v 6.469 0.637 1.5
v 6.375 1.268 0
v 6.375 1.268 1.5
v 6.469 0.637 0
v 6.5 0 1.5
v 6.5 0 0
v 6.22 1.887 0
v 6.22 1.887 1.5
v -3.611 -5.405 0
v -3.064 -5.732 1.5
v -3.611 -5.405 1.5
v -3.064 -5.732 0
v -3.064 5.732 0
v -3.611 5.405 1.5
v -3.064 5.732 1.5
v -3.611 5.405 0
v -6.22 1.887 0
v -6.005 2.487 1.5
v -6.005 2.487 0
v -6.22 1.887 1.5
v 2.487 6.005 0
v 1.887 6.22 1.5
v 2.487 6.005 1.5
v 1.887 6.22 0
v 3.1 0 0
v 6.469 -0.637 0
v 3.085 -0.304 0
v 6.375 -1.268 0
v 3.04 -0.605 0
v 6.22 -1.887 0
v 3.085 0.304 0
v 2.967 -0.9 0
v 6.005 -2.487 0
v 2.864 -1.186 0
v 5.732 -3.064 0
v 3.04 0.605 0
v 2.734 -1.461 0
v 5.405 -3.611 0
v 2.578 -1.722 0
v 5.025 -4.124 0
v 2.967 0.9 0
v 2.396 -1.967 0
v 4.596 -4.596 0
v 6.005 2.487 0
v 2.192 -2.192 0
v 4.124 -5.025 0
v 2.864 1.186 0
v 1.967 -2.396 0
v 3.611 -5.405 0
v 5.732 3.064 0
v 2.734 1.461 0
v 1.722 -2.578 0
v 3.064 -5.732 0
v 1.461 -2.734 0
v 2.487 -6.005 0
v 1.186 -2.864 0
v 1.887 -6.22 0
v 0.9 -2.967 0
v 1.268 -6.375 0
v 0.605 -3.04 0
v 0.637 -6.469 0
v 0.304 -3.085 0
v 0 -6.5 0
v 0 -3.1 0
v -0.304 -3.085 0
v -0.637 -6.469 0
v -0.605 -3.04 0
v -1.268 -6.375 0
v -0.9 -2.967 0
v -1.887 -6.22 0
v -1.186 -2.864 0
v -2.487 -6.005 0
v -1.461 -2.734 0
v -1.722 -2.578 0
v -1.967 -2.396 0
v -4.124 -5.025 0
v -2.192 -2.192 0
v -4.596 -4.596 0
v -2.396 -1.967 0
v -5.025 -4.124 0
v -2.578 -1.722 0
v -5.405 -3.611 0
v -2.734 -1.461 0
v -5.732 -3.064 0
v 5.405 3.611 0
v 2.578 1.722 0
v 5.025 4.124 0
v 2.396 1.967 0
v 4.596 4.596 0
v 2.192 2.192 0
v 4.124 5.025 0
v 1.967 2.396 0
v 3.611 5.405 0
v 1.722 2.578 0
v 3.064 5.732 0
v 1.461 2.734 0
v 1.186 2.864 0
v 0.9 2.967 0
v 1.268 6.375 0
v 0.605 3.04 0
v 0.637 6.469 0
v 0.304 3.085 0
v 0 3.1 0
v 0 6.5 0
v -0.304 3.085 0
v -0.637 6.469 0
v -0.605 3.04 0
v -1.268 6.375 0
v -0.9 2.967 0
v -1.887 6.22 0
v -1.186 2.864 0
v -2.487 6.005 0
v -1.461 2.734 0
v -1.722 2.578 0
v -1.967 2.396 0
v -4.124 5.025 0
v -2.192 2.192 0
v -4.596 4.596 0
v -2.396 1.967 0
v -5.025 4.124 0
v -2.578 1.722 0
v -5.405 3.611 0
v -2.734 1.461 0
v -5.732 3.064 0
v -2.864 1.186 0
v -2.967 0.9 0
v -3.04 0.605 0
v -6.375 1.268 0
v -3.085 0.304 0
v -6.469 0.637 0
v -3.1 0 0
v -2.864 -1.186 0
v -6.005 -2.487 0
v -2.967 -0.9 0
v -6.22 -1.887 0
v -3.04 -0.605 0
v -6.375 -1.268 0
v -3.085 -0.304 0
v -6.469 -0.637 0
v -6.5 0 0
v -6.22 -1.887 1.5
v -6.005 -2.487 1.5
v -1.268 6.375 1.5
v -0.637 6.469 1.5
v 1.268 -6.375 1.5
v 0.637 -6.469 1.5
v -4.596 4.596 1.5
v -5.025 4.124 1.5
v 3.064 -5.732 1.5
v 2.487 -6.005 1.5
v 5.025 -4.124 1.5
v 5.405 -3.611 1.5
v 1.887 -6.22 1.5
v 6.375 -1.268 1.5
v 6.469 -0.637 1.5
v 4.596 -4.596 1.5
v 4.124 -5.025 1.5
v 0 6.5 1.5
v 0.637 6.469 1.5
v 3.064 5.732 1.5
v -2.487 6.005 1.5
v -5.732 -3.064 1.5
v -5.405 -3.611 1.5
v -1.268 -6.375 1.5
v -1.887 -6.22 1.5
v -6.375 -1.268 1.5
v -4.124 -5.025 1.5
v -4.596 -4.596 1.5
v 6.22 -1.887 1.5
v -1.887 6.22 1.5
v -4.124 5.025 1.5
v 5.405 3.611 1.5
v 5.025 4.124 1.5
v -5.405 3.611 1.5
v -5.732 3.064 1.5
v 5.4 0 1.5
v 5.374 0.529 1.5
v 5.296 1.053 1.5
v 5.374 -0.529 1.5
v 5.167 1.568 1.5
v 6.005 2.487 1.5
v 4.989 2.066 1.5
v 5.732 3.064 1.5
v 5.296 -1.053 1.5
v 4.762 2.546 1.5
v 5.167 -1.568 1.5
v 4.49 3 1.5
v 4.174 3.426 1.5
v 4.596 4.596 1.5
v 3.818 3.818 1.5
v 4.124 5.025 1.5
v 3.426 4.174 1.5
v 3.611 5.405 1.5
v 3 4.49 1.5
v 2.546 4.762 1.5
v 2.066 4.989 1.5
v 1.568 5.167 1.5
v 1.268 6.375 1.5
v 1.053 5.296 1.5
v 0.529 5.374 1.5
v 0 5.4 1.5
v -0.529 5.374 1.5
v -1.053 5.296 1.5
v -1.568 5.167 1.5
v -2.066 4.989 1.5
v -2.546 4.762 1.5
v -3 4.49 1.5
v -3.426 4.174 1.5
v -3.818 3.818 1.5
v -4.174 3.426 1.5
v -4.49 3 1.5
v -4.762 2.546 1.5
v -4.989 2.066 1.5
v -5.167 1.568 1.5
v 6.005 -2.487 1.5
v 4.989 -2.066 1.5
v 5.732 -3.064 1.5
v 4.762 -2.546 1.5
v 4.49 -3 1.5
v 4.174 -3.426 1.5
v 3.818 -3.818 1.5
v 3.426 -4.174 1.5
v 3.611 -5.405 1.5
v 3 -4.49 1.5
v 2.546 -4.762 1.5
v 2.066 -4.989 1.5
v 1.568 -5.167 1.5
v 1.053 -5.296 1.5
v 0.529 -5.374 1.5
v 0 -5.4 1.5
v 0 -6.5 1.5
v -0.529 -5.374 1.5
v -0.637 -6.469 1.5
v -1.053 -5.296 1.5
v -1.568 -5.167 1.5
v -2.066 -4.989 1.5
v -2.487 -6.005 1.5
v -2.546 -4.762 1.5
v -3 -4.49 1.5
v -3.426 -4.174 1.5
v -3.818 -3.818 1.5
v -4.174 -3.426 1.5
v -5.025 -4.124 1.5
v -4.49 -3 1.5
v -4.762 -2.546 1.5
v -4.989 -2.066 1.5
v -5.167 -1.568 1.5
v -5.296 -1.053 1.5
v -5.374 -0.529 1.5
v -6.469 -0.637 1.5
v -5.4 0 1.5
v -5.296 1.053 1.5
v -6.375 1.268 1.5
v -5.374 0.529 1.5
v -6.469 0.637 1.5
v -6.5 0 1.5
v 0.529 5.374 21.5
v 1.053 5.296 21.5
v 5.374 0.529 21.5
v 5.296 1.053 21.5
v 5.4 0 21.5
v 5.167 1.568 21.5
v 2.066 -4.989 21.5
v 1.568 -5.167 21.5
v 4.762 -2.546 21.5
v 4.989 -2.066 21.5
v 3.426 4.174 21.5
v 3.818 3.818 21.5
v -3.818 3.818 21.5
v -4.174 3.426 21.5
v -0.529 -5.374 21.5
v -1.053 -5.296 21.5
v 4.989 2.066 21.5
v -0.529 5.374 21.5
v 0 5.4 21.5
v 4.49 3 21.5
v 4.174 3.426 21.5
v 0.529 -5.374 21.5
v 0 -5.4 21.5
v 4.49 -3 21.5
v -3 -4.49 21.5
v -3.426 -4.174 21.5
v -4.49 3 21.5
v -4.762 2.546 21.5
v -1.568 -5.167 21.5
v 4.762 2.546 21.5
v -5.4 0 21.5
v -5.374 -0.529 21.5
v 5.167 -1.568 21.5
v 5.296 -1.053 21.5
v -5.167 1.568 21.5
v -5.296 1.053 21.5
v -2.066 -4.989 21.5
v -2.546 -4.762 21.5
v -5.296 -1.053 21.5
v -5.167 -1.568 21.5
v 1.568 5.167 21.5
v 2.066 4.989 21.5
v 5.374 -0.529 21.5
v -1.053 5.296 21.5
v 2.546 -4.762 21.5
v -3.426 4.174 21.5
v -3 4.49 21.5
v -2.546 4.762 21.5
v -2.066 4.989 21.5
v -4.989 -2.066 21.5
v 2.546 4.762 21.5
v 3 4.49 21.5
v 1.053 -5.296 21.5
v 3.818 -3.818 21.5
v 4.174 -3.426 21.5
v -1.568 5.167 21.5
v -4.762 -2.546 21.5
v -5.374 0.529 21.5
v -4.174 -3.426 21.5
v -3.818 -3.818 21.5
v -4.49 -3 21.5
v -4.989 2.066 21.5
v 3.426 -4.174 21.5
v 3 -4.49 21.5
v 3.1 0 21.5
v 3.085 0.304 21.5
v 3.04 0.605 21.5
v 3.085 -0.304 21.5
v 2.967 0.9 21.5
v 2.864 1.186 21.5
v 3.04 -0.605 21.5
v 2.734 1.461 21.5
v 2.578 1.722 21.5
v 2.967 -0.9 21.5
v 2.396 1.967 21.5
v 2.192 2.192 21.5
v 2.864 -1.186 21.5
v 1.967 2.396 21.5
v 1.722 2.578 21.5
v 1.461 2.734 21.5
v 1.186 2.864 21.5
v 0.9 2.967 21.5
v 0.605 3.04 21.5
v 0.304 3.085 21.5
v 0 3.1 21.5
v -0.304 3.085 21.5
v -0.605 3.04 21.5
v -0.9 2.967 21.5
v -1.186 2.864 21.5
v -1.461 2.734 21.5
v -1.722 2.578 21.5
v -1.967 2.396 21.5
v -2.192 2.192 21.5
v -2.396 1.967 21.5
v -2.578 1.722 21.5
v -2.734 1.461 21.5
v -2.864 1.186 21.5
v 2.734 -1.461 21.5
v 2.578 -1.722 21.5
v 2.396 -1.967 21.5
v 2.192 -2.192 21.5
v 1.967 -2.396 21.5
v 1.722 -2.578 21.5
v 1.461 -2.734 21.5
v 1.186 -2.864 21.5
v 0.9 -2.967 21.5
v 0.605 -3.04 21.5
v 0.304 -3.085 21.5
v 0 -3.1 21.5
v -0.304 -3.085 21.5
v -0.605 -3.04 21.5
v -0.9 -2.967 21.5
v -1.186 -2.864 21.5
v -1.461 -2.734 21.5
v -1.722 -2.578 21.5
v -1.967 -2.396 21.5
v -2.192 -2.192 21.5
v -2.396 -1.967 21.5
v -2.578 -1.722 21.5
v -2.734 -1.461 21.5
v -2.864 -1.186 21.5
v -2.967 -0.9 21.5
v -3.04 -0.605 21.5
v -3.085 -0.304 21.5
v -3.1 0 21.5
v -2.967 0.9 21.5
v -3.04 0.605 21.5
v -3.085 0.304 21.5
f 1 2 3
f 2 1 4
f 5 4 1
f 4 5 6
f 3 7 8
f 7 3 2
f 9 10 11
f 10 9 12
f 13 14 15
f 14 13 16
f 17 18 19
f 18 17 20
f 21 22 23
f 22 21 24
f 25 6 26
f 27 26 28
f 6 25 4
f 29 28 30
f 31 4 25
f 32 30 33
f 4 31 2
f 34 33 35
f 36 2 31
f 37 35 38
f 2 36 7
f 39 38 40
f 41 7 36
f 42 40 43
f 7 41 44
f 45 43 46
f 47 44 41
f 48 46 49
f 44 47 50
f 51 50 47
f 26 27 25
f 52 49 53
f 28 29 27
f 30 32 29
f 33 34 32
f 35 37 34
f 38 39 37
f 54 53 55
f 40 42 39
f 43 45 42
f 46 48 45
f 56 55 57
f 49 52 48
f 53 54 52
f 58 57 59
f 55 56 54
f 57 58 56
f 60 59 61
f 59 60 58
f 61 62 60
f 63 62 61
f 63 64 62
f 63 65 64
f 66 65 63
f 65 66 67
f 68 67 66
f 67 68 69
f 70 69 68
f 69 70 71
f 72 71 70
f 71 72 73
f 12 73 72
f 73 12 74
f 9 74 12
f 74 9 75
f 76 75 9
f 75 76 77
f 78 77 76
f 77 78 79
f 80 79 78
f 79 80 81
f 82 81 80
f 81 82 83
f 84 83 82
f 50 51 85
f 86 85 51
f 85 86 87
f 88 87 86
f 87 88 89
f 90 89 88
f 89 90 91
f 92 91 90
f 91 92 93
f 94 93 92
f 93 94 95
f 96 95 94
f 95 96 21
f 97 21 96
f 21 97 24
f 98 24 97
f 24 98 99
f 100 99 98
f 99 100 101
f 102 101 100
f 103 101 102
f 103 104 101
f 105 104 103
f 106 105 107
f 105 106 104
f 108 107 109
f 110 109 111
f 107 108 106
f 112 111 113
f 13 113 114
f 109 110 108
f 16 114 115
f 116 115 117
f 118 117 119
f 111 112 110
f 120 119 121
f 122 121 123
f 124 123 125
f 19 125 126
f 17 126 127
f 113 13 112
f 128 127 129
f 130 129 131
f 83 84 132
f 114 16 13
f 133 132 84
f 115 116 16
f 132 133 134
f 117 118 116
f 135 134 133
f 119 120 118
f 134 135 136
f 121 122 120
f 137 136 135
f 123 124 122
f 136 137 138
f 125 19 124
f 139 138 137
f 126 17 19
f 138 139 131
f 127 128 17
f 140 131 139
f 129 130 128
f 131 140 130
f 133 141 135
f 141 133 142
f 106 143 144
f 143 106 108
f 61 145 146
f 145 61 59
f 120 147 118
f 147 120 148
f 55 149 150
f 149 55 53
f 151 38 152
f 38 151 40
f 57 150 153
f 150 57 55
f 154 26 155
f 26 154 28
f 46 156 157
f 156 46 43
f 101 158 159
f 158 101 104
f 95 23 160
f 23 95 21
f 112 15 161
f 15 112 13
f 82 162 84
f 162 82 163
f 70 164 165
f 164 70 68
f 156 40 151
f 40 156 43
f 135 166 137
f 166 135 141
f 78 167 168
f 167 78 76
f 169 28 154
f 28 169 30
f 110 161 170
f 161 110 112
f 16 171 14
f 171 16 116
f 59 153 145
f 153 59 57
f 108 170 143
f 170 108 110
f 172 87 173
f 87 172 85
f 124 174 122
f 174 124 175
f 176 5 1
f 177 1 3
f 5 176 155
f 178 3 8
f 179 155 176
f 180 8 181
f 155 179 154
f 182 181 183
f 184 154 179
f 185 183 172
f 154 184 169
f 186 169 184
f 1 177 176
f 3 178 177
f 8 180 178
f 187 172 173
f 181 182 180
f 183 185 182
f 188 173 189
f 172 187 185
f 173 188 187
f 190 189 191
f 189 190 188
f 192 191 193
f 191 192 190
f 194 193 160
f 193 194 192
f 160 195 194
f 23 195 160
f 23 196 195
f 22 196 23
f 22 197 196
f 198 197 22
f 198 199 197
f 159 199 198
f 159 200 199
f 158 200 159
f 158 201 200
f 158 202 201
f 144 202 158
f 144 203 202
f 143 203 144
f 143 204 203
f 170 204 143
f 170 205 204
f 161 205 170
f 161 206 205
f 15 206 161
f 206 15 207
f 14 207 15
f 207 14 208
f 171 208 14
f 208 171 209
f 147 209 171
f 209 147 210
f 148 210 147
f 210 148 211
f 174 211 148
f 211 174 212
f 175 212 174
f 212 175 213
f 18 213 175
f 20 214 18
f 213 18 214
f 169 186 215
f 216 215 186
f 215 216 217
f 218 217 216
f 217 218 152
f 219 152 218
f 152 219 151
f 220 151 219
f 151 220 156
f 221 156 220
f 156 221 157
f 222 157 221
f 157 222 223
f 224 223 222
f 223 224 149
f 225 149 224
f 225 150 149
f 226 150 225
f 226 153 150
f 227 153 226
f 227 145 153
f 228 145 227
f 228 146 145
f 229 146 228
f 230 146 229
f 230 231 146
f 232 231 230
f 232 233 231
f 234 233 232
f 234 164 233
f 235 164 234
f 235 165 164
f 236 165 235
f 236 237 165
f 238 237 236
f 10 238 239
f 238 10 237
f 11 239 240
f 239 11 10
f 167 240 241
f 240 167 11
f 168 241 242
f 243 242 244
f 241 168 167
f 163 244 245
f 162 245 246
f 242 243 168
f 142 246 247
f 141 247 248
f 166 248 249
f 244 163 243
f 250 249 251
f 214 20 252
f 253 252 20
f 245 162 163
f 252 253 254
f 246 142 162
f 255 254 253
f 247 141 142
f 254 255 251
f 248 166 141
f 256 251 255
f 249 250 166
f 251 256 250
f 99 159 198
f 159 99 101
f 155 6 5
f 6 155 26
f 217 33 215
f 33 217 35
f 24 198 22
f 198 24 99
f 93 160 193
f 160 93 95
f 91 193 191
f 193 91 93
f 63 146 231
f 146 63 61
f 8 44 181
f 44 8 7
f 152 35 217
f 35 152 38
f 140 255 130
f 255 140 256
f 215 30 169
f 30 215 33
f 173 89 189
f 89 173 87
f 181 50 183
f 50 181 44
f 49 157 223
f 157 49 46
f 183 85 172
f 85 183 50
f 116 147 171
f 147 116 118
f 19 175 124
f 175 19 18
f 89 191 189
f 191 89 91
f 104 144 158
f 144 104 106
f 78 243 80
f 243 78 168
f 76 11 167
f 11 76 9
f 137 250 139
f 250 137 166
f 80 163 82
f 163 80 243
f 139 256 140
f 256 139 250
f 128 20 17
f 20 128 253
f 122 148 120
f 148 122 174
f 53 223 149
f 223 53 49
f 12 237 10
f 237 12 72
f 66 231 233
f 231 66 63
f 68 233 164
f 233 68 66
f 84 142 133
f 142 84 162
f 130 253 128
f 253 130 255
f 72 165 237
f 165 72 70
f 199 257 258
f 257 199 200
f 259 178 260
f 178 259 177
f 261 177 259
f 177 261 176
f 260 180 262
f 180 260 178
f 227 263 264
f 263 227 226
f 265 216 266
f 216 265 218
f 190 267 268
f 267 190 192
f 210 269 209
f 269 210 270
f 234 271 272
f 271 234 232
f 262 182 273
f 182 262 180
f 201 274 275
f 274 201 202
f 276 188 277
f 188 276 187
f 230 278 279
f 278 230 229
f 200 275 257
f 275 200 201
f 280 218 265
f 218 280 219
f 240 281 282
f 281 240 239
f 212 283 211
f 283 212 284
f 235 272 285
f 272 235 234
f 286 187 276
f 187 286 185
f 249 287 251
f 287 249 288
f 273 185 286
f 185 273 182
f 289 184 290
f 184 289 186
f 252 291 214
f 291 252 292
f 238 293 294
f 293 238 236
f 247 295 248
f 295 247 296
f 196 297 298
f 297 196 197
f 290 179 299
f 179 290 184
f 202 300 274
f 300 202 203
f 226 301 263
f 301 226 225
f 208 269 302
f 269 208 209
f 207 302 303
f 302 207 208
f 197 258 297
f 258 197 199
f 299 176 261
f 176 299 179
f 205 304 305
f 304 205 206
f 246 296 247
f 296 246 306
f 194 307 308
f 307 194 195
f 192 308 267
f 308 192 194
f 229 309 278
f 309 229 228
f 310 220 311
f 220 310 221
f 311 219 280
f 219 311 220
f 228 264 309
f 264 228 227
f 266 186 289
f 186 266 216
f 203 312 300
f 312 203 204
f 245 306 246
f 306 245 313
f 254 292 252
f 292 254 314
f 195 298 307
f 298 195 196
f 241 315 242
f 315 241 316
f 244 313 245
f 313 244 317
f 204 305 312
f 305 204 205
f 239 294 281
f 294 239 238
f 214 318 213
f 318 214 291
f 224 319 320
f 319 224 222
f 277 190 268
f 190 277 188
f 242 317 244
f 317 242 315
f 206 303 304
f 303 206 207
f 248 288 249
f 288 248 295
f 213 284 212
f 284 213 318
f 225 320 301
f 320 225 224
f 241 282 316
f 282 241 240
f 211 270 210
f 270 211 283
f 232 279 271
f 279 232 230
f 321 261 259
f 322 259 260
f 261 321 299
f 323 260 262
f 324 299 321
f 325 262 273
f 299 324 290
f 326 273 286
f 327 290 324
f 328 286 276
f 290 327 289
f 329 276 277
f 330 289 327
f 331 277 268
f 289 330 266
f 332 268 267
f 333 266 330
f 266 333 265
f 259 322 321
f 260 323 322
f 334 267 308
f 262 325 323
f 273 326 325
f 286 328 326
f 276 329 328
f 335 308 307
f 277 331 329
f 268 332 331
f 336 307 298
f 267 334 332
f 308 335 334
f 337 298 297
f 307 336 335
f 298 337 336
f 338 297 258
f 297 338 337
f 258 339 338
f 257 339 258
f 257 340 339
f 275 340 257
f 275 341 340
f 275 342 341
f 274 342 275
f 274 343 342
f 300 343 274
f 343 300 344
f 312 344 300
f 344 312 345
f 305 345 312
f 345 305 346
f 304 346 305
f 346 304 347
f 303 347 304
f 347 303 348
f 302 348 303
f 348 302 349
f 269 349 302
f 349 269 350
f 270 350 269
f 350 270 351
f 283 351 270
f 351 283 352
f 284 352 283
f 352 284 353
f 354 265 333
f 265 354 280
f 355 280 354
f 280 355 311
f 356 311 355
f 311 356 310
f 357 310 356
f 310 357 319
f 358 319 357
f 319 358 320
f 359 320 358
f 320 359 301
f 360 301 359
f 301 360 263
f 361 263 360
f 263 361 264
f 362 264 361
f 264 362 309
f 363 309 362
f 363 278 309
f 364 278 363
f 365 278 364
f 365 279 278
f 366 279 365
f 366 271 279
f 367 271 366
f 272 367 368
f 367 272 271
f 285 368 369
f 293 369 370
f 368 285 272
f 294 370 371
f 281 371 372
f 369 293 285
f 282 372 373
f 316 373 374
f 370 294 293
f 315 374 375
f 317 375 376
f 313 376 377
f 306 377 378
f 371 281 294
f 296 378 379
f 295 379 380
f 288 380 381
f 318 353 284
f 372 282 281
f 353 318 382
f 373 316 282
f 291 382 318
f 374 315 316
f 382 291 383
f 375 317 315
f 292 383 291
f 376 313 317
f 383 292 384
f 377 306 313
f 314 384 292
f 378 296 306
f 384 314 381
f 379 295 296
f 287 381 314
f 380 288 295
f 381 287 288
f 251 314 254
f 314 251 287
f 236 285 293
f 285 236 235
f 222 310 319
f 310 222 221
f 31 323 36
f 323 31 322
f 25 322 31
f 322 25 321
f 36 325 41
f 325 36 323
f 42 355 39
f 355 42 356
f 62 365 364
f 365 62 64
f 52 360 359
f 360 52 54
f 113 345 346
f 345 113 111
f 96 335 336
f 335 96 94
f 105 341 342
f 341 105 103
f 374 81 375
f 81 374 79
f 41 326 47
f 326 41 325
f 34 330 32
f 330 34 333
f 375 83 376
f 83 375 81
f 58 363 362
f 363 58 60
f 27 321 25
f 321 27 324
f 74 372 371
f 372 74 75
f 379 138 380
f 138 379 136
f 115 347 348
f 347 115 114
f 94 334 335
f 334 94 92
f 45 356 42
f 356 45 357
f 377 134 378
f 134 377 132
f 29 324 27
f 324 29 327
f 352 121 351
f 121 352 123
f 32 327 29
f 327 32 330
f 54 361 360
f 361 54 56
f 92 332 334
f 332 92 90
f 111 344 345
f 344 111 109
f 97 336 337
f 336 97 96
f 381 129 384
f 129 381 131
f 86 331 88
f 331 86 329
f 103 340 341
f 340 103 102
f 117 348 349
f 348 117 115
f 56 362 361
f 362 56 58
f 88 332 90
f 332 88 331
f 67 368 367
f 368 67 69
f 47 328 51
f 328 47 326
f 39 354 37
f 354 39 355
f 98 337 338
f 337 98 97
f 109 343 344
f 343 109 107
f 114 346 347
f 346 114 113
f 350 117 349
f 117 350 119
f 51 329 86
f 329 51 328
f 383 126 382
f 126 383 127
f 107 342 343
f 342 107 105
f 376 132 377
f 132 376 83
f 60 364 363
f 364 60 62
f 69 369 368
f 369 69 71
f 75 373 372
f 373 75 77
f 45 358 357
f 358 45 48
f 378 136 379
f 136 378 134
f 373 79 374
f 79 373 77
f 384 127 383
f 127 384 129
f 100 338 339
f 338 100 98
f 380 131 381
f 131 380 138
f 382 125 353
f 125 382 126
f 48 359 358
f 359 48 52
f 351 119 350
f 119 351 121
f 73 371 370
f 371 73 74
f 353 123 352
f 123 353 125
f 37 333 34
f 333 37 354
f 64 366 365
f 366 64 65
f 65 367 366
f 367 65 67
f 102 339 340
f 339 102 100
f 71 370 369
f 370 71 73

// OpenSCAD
// Adapter sleeve for 0.2 mL PCR tube in 1.5 mL rack hole
// Dimensions in mm

// --- Collar dimensions (base on print bed) ---
collar_diameter = 13;       // Outer diameter of the collar
collar_height = 1.5;        // Height of the collar (z=0 to z=1.5)

// --- Sleeve body dimensions ---
sleeve_outer_diameter = 10.8; // Outer diameter of the sleeve body
sleeve_top_z = 21.5;          // Total height of the part (z=0 to z=21.5)
sleeve_body_height = sleeve_top_z - collar_height; // Height of the cylindrical body above collar

// --- Bore dimensions ---
bore_diameter = 6.2;          // Inner diameter of the through-hole

// --- Print orientation ---
// The part rests on the XY plane at z=0.
// Collar is at the bottom (z=0 to z=1.5).
// Sleeve body rises from z=1.5 to z=21.5.
// Centered on origin in X and Y.

// Calculate radii
collar_radius = collar_diameter / 2;
sleeve_outer_radius = sleeve_outer_diameter / 2;
bore_radius = bore_diameter / 2;

// Safety margin for boolean operations to avoid coplanar faces
cut_margin = 0.02;

// --- Build the part ---
module adapter_sleeve() {
    union() {
        // 1. The Collar (Base)
        // Cylinder centered at origin, radius collar_radius, height collar_height
        cylinder(r = collar_radius, h = collar_height, center = false, $fn = 64);

        // 2. The Sleeve Body
        // Cylinder sitting on top of the collar, from z=1.5 to z=21.5
        // Height is sleeve_body_height
        // Radius is sleeve_outer_radius
        translate([0, 0, collar_height]) {
            cylinder(r = sleeve_outer_radius, h = sleeve_body_height, center = false, $fn = 64);
        }

        // 3. The Bore (Hole)
        // A cylinder subtracted from the union.
        // It must run through the full height (0 to 21.5).
        // To ensure clean cutting without coplanar issues, we extend it slightly.
        // We use a single cylinder for the hole, extending past both ends.
        hole_height = sleeve_top_z + cut_margin * 2;
        hole_center_z = sleeve_top_z / 2;
        
        // Subtract the bore
        // Note: In OpenSCAD, we perform the difference outside the union or use a separate module.
        // Here, we build the solid first, then subtract.
    }
}

// Final assembly with boolean difference
difference() {
    // Solid part
    adapter_sleeve();

    // Cutting tool for the bore
    // Extends from z = -cut_margin to z = sleeve_top_z + cut_margin
    cylinder(
        r = bore_radius, 
        h = sleeve_top_z + cut_margin * 2, 
        center = false, 
        $fn = 64
    );
}
